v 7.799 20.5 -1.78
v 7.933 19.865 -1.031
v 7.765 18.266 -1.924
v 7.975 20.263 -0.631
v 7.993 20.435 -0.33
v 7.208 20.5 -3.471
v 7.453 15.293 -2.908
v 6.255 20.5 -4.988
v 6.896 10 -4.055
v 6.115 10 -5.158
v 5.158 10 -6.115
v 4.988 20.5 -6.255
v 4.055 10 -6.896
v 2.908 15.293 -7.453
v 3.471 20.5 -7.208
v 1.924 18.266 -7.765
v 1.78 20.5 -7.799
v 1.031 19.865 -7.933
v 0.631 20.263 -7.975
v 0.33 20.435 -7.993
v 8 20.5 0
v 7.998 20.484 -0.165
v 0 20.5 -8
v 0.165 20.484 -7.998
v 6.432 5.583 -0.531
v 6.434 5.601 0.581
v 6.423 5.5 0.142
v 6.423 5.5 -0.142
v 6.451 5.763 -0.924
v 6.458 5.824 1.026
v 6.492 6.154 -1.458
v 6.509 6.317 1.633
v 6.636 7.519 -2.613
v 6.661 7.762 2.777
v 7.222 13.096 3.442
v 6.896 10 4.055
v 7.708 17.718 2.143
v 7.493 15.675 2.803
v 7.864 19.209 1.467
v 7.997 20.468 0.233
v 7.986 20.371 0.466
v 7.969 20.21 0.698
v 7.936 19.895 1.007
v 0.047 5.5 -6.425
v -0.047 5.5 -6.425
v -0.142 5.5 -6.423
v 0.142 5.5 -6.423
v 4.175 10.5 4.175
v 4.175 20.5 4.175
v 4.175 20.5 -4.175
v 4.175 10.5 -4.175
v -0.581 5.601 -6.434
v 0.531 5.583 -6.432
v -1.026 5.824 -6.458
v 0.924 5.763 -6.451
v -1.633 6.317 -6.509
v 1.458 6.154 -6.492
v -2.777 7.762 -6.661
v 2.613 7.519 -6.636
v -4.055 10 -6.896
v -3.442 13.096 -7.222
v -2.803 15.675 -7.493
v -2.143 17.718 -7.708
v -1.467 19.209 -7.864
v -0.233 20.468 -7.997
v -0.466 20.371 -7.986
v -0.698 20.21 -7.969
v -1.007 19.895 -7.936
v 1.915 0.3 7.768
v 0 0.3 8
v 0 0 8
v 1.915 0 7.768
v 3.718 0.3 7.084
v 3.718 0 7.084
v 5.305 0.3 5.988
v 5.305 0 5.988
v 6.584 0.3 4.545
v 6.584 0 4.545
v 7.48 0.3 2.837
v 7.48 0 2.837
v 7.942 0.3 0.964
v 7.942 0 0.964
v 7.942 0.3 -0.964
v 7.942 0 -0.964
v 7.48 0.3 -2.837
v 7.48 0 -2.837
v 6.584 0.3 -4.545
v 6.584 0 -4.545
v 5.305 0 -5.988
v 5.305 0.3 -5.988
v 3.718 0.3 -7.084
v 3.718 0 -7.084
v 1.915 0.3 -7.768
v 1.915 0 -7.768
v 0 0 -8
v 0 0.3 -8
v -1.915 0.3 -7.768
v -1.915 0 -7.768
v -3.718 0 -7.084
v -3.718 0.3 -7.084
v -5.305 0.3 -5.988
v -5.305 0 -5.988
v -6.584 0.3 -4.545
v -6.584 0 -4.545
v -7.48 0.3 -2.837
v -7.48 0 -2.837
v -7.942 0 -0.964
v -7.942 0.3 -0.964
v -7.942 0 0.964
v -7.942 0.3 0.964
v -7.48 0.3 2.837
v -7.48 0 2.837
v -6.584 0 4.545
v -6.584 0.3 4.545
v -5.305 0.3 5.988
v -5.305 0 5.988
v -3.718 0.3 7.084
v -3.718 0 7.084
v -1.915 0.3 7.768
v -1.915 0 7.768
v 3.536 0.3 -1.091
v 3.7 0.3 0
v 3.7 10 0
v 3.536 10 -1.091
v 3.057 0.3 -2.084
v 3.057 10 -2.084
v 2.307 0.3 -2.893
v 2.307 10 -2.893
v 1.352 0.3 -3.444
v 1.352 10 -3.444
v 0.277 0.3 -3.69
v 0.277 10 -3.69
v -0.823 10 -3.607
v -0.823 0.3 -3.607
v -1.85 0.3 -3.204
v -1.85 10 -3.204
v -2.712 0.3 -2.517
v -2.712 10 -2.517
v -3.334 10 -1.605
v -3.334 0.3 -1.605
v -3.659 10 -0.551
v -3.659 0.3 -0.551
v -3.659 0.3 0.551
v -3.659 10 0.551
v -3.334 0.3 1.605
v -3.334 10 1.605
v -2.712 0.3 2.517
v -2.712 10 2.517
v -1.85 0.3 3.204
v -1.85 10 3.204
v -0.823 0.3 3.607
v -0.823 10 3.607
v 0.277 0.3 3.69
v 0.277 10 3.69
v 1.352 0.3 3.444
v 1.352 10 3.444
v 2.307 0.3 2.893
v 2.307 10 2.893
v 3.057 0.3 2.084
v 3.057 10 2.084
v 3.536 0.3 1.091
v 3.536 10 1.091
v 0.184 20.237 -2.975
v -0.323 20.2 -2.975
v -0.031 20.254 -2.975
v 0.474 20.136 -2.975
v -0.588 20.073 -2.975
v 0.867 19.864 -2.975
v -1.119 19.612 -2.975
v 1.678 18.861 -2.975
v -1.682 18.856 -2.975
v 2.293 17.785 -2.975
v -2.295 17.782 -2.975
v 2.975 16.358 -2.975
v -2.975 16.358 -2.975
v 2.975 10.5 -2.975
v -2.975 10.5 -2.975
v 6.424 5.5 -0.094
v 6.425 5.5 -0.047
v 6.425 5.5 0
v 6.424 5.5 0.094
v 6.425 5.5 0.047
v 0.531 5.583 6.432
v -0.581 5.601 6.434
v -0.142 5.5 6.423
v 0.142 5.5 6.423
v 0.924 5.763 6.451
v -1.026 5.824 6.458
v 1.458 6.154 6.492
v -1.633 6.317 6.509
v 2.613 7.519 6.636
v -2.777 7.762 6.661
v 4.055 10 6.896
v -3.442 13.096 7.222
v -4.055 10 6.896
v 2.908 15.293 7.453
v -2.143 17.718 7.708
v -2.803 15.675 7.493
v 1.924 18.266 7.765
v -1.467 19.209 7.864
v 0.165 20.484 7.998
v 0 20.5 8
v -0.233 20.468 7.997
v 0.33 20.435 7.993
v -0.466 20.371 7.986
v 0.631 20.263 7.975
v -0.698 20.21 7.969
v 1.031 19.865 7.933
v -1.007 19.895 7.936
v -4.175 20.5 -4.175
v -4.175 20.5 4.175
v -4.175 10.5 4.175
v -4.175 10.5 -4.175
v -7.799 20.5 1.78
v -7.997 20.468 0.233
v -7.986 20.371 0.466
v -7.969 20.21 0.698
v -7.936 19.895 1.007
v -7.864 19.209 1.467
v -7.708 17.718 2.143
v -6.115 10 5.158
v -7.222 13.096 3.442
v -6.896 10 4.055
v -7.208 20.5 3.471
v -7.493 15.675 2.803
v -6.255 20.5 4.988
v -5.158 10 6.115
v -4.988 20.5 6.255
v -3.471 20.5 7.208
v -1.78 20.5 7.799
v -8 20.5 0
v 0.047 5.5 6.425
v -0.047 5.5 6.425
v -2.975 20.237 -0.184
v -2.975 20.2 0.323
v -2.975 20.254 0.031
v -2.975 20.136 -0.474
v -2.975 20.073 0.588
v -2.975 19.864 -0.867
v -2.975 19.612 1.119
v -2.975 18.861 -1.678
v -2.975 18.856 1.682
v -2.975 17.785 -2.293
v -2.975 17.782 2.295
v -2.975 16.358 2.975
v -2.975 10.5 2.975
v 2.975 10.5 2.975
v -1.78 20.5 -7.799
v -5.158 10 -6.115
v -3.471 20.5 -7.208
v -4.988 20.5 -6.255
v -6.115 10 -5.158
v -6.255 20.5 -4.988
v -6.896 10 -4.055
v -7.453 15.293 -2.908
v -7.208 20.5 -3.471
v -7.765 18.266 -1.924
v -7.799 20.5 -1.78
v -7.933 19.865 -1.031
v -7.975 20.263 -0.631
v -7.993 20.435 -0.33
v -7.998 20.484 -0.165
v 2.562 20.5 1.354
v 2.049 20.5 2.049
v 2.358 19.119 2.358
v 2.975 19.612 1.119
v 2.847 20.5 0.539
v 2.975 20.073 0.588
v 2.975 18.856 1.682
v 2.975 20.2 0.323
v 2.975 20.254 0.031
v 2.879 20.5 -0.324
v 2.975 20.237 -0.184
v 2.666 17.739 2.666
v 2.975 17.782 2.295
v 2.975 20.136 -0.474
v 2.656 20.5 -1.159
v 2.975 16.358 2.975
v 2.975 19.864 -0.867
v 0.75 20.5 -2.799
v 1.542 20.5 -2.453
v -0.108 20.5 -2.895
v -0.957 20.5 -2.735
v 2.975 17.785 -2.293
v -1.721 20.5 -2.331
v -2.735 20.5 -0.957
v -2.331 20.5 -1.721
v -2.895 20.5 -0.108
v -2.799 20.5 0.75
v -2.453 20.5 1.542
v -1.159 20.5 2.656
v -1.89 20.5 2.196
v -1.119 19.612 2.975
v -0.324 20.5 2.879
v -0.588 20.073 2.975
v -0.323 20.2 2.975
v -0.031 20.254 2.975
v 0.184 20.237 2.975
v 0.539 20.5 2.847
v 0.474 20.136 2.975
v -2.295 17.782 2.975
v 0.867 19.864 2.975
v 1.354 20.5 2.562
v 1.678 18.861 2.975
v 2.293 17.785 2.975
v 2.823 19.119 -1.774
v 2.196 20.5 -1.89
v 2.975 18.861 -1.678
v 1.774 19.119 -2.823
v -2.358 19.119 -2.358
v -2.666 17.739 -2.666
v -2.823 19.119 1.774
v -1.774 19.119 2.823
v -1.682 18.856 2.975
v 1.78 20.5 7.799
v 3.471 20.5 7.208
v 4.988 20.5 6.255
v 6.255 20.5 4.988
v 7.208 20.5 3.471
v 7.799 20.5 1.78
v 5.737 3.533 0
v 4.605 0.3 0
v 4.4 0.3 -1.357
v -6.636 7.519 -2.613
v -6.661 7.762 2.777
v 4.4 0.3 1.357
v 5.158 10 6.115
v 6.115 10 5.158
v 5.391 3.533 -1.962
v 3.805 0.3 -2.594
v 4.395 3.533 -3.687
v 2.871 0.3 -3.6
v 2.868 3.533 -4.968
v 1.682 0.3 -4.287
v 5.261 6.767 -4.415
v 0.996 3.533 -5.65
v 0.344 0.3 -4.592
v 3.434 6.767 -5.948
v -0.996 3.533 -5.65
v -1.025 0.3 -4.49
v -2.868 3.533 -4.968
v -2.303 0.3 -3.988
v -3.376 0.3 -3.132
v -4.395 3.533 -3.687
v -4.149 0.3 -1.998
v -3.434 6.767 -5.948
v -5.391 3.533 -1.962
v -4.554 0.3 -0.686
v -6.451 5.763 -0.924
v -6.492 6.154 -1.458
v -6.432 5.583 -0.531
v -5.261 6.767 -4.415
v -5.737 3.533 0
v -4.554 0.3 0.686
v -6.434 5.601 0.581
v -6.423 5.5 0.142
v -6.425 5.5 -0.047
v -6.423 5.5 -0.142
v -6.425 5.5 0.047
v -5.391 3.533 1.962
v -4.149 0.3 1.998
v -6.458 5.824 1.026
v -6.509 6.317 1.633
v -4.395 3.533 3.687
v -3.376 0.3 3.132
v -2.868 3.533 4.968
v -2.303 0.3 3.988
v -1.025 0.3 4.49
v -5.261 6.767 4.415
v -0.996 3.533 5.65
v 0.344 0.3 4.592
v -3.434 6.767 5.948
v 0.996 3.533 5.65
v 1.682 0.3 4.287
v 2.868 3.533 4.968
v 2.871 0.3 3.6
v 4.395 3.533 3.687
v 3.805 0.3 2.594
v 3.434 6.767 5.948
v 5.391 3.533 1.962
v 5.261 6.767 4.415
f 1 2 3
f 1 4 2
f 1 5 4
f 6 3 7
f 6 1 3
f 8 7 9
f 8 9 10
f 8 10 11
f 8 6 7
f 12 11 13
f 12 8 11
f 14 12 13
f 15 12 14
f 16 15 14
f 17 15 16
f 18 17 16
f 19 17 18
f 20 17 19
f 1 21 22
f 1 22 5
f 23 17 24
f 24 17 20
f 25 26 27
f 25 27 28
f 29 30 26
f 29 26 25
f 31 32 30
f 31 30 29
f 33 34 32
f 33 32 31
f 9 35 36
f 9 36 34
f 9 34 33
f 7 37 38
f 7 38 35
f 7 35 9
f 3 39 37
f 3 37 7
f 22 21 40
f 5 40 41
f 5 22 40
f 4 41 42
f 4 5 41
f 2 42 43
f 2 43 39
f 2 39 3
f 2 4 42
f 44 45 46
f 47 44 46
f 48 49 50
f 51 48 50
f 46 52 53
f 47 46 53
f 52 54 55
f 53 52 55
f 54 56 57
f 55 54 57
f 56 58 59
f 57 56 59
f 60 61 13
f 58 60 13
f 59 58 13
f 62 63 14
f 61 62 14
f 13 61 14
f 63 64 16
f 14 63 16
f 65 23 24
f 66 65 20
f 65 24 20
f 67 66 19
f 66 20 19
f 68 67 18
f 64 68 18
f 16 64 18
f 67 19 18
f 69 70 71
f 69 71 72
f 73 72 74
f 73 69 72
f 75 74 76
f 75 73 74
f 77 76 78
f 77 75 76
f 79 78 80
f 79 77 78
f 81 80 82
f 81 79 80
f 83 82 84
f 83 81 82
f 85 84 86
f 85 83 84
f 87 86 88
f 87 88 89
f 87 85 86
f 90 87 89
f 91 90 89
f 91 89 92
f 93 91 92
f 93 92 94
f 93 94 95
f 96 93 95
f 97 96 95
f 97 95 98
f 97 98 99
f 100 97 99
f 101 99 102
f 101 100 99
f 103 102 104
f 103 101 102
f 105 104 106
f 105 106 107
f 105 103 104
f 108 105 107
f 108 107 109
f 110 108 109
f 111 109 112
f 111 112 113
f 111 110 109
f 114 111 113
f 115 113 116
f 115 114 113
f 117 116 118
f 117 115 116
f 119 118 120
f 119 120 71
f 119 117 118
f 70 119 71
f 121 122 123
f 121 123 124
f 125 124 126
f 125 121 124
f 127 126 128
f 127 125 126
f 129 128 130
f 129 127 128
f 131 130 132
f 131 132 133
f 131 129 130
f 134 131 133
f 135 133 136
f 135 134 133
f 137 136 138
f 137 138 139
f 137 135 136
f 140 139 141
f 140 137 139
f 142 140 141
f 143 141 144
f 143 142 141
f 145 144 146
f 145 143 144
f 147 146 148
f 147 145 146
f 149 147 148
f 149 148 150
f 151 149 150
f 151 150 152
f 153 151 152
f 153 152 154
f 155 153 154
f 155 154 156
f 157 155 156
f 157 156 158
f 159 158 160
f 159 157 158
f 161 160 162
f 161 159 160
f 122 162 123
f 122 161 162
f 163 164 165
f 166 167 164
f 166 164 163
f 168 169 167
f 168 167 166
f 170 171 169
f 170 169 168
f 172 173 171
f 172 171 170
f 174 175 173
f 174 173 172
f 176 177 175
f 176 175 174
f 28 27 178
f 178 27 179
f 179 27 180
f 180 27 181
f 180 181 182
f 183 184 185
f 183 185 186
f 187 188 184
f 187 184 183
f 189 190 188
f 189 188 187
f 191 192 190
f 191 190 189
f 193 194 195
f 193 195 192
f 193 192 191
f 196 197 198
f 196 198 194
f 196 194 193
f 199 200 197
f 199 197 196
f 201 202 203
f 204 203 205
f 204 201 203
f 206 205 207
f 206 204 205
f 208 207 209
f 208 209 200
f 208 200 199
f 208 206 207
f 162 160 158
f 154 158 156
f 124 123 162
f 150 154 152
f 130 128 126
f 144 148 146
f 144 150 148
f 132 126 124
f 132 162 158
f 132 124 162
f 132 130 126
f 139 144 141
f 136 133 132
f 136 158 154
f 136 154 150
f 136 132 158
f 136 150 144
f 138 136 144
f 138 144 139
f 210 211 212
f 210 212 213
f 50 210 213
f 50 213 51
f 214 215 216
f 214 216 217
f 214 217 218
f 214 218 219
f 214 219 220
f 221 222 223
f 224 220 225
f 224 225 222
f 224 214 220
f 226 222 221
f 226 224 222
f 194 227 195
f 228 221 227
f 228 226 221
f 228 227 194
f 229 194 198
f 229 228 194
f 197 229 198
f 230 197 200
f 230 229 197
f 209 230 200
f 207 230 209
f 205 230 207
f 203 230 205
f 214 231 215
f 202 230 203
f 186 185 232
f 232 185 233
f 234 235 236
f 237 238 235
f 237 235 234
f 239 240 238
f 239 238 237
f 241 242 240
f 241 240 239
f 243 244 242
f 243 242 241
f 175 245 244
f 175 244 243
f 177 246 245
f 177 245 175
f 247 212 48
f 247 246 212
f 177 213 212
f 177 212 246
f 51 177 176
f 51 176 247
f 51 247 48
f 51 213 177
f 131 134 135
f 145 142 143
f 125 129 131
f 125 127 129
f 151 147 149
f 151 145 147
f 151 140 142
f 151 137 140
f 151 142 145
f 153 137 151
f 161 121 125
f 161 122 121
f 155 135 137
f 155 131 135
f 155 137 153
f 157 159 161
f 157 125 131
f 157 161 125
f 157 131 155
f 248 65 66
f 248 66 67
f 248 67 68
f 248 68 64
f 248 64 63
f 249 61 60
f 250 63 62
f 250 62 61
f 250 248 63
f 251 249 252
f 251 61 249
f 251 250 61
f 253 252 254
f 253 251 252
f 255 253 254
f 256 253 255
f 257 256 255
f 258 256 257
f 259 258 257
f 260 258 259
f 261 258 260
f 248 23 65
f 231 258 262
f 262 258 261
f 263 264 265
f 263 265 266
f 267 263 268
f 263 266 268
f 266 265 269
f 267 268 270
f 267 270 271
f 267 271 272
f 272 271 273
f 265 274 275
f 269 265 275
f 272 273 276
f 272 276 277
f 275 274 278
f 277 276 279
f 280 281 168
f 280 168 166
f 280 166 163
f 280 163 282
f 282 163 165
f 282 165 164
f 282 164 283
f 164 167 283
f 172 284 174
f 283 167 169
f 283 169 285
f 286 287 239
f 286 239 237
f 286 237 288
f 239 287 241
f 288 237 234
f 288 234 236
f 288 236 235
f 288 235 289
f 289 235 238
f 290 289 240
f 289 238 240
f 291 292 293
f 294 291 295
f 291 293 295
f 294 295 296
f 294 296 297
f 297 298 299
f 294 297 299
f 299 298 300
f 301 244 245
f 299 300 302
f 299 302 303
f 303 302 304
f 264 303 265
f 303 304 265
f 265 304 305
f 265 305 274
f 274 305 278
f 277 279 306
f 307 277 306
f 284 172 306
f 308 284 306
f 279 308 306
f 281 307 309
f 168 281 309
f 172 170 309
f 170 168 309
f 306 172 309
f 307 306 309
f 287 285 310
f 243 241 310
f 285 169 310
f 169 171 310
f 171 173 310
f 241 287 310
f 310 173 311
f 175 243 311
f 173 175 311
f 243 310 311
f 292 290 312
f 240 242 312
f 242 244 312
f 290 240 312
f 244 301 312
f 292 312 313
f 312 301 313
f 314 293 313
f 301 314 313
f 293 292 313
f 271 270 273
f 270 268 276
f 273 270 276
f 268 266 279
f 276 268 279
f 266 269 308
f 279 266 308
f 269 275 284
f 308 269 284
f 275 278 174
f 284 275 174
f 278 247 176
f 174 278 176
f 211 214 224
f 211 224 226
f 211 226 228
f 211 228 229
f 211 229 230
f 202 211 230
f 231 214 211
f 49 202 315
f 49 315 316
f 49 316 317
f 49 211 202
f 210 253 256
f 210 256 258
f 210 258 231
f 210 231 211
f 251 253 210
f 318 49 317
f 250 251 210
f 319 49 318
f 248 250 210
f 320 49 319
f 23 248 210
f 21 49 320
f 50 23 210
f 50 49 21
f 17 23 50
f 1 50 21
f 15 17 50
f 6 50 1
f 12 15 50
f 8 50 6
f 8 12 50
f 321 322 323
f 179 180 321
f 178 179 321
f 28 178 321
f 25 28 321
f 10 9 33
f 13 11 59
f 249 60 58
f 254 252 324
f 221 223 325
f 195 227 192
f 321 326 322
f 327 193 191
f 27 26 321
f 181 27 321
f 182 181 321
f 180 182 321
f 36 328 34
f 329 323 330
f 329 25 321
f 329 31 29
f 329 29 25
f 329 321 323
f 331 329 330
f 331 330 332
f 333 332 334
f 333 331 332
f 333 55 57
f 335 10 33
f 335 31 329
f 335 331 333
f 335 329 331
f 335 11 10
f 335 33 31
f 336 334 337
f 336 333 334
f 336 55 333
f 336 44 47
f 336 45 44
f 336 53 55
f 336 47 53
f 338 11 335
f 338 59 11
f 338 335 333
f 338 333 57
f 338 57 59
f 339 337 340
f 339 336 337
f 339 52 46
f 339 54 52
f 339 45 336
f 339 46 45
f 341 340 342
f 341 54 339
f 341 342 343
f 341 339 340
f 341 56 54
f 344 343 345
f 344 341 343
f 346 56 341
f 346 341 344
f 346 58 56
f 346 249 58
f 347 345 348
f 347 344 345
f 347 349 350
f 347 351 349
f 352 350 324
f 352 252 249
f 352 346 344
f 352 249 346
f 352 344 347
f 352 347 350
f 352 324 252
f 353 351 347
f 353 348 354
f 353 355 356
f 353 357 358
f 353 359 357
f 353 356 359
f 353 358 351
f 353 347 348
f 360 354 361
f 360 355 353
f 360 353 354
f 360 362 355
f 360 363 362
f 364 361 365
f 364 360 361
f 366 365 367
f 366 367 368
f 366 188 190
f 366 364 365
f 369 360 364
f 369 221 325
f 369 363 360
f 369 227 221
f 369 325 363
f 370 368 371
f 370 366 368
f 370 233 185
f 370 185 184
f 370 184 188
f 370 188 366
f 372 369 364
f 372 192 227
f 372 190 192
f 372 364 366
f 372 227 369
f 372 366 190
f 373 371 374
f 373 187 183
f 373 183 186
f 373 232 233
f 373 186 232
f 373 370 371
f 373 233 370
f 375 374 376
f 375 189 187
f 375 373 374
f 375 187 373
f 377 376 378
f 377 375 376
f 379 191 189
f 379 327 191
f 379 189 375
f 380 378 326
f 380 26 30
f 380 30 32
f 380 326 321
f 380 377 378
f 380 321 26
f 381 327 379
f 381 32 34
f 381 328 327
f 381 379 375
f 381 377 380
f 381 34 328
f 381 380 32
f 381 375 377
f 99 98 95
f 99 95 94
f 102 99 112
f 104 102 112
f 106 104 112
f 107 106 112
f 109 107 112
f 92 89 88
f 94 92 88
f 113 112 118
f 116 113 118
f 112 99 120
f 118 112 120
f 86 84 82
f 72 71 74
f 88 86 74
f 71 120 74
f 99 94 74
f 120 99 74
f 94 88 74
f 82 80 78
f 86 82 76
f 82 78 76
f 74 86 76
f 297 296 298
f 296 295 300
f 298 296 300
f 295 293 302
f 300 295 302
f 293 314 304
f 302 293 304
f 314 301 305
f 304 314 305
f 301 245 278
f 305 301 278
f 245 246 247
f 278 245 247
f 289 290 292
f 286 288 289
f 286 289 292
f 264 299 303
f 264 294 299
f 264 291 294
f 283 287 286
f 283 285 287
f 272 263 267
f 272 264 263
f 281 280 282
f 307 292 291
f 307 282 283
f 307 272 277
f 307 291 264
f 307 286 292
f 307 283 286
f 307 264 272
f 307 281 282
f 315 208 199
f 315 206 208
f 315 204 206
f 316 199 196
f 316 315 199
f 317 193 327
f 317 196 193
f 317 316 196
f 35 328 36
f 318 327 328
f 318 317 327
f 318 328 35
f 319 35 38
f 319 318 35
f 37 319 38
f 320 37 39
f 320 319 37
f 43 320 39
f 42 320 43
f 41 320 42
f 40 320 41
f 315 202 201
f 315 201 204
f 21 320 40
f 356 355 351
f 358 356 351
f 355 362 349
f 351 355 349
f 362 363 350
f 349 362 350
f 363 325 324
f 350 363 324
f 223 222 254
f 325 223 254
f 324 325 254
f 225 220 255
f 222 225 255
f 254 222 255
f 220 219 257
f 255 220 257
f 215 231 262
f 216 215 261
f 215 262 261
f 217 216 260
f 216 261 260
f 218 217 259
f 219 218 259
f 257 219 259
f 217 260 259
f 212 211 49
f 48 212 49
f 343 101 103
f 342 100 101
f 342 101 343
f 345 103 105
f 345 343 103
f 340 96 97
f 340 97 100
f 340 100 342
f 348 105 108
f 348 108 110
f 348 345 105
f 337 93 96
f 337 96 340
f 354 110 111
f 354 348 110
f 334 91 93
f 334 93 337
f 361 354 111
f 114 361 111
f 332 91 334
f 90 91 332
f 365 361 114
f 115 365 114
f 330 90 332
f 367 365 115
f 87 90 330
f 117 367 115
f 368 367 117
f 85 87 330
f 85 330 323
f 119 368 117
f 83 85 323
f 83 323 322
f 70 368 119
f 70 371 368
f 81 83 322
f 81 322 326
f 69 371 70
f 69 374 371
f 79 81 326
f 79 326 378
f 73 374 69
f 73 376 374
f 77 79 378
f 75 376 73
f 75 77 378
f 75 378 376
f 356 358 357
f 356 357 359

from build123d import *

# Parameters (mm, degrees)
SKETCH2_W           = 8.35
SKETCH2_H           = 8.35
CUT_EXTRUDE1_DEPTH  = 10
SKETCH3_W           = 5.95
SKETCH3_H           = 5.95
BOSS_EXTRUDE1_DEPTH = 10
SKETCH6_W           = 20
SKETCH6_H           = 20
SKETCH6_W_2         = 16
SKETCH6_H_2         = 16
CUT_EXTRUDE2_DEPTH  = 15
CUT_EXTRUDE2_DRAFT  = 6
BOSS_EXTRUDE2_START = 0.3
SKETCH5_R           = 8
BOSS_EXTRUDE2_DEPTH = 0.3


with BuildPart() as part:
    # Sketch1 → Revolve1 (revolve)
    with BuildSketch(Plane.XY):
        Polygon((3.7, 10), (3.7, 0), (4.5, 0), (8, 10), (8, 20.5), (0, 20.5), (0, 10), align=None)
    revolve(axis=Axis((0, 0, 0), (0, 1, 0)))

    # Sketch2 → Cut-Extrude1 (cut)
    with BuildSketch(Plane(origin=(0, 20.5, 0), x_dir=(1, 0, 0), z_dir=(0, 1, 0))):
        Rectangle(SKETCH2_W, SKETCH2_H)
    extrude(amount=-CUT_EXTRUDE1_DEPTH, mode=Mode.SUBTRACT)


with BuildPart() as body_2:
    # Sketch3 → Boss-Extrude1 (new body)
    with BuildSketch(Plane(origin=(0, 10.5, 0), x_dir=(1, 0, 0), z_dir=(0, 1, 0))):
        Rectangle(SKETCH3_W, SKETCH3_H)
    extrude(amount=BOSS_EXTRUDE1_DEPTH)

    # Sketch4 → Cut-Revolve1 (revolve, cut)
    with BuildSketch(Plane.XY, mode=Mode.PRIVATE) as cut_revolve1_sk:
        Polygon((1, 26.5), (7.325, 6.5), (7.325, 26.5), align=None)
    revolve(cut_revolve1_sk.sketch.rotate(Axis((0, 20.5, 0), (0, 1, 0)), 315.000122561), axis=Axis((0, 20.5, 0), (0, 1, 0)), mode=Mode.SUBTRACT)


with BuildPart() as cut_extrude2_tool:
    # Sketch6 → Cut-Extrude2 (with draft: the straight prism first)
    with BuildSketch(Plane(origin=(0, 20.5, 0), x_dir=(1, 0, 0), z_dir=(0, 1, 0))):
        Rectangle(SKETCH6_W, SKETCH6_H)
        Rectangle(SKETCH6_W_2, SKETCH6_H_2, mode=Mode.SUBTRACT)
    extrude(amount=-CUT_EXTRUDE2_DEPTH)
    # Cut-Extrude2: the draft: its side faces are tilted about the plane it starts from
    cut_extrude2_sides = [cut_extrude2_tool.faces().sort_by_distance(p)[0] for p in [
        (-10, 13, 0),
        (0, 13, 10),
        (10, 13, 0),
        (0, 13, -10),
        (0, 13, -8),
        (8, 13, 0),
        (0, 13, 8),
        (-8, 13, 0),
    ]]
    draft(cut_extrude2_sides, Plane(origin=(0, 20.5, 0), x_dir=(1, 0, 0), z_dir=(0, 1, 0)), CUT_EXTRUDE2_DRAFT)


with BuildPart() as part_1:
    add(part.part)

    # Cut-Extrude2: cut by cut_extrude2_tool
    add(cut_extrude2_tool.part, mode=Mode.SUBTRACT)

    # Intersect2: read off the stored shape, not the designer's step
    # Intersect2: union body 2
    add(body_2.part)

    # Sketch5 → Boss-Extrude2 (add)
    with BuildSketch(Plane(origin=(0, 0, 0), x_dir=(1, 0, 0), z_dir=(0, 1, 0)).offset(BOSS_EXTRUDE2_START)):
        with Locations(Location((0, 0, 0), (0, 0, 270))):
            Circle(SKETCH5_R)
    extrude(amount=-BOSS_EXTRUDE2_DEPTH)


solid = part_1.part
